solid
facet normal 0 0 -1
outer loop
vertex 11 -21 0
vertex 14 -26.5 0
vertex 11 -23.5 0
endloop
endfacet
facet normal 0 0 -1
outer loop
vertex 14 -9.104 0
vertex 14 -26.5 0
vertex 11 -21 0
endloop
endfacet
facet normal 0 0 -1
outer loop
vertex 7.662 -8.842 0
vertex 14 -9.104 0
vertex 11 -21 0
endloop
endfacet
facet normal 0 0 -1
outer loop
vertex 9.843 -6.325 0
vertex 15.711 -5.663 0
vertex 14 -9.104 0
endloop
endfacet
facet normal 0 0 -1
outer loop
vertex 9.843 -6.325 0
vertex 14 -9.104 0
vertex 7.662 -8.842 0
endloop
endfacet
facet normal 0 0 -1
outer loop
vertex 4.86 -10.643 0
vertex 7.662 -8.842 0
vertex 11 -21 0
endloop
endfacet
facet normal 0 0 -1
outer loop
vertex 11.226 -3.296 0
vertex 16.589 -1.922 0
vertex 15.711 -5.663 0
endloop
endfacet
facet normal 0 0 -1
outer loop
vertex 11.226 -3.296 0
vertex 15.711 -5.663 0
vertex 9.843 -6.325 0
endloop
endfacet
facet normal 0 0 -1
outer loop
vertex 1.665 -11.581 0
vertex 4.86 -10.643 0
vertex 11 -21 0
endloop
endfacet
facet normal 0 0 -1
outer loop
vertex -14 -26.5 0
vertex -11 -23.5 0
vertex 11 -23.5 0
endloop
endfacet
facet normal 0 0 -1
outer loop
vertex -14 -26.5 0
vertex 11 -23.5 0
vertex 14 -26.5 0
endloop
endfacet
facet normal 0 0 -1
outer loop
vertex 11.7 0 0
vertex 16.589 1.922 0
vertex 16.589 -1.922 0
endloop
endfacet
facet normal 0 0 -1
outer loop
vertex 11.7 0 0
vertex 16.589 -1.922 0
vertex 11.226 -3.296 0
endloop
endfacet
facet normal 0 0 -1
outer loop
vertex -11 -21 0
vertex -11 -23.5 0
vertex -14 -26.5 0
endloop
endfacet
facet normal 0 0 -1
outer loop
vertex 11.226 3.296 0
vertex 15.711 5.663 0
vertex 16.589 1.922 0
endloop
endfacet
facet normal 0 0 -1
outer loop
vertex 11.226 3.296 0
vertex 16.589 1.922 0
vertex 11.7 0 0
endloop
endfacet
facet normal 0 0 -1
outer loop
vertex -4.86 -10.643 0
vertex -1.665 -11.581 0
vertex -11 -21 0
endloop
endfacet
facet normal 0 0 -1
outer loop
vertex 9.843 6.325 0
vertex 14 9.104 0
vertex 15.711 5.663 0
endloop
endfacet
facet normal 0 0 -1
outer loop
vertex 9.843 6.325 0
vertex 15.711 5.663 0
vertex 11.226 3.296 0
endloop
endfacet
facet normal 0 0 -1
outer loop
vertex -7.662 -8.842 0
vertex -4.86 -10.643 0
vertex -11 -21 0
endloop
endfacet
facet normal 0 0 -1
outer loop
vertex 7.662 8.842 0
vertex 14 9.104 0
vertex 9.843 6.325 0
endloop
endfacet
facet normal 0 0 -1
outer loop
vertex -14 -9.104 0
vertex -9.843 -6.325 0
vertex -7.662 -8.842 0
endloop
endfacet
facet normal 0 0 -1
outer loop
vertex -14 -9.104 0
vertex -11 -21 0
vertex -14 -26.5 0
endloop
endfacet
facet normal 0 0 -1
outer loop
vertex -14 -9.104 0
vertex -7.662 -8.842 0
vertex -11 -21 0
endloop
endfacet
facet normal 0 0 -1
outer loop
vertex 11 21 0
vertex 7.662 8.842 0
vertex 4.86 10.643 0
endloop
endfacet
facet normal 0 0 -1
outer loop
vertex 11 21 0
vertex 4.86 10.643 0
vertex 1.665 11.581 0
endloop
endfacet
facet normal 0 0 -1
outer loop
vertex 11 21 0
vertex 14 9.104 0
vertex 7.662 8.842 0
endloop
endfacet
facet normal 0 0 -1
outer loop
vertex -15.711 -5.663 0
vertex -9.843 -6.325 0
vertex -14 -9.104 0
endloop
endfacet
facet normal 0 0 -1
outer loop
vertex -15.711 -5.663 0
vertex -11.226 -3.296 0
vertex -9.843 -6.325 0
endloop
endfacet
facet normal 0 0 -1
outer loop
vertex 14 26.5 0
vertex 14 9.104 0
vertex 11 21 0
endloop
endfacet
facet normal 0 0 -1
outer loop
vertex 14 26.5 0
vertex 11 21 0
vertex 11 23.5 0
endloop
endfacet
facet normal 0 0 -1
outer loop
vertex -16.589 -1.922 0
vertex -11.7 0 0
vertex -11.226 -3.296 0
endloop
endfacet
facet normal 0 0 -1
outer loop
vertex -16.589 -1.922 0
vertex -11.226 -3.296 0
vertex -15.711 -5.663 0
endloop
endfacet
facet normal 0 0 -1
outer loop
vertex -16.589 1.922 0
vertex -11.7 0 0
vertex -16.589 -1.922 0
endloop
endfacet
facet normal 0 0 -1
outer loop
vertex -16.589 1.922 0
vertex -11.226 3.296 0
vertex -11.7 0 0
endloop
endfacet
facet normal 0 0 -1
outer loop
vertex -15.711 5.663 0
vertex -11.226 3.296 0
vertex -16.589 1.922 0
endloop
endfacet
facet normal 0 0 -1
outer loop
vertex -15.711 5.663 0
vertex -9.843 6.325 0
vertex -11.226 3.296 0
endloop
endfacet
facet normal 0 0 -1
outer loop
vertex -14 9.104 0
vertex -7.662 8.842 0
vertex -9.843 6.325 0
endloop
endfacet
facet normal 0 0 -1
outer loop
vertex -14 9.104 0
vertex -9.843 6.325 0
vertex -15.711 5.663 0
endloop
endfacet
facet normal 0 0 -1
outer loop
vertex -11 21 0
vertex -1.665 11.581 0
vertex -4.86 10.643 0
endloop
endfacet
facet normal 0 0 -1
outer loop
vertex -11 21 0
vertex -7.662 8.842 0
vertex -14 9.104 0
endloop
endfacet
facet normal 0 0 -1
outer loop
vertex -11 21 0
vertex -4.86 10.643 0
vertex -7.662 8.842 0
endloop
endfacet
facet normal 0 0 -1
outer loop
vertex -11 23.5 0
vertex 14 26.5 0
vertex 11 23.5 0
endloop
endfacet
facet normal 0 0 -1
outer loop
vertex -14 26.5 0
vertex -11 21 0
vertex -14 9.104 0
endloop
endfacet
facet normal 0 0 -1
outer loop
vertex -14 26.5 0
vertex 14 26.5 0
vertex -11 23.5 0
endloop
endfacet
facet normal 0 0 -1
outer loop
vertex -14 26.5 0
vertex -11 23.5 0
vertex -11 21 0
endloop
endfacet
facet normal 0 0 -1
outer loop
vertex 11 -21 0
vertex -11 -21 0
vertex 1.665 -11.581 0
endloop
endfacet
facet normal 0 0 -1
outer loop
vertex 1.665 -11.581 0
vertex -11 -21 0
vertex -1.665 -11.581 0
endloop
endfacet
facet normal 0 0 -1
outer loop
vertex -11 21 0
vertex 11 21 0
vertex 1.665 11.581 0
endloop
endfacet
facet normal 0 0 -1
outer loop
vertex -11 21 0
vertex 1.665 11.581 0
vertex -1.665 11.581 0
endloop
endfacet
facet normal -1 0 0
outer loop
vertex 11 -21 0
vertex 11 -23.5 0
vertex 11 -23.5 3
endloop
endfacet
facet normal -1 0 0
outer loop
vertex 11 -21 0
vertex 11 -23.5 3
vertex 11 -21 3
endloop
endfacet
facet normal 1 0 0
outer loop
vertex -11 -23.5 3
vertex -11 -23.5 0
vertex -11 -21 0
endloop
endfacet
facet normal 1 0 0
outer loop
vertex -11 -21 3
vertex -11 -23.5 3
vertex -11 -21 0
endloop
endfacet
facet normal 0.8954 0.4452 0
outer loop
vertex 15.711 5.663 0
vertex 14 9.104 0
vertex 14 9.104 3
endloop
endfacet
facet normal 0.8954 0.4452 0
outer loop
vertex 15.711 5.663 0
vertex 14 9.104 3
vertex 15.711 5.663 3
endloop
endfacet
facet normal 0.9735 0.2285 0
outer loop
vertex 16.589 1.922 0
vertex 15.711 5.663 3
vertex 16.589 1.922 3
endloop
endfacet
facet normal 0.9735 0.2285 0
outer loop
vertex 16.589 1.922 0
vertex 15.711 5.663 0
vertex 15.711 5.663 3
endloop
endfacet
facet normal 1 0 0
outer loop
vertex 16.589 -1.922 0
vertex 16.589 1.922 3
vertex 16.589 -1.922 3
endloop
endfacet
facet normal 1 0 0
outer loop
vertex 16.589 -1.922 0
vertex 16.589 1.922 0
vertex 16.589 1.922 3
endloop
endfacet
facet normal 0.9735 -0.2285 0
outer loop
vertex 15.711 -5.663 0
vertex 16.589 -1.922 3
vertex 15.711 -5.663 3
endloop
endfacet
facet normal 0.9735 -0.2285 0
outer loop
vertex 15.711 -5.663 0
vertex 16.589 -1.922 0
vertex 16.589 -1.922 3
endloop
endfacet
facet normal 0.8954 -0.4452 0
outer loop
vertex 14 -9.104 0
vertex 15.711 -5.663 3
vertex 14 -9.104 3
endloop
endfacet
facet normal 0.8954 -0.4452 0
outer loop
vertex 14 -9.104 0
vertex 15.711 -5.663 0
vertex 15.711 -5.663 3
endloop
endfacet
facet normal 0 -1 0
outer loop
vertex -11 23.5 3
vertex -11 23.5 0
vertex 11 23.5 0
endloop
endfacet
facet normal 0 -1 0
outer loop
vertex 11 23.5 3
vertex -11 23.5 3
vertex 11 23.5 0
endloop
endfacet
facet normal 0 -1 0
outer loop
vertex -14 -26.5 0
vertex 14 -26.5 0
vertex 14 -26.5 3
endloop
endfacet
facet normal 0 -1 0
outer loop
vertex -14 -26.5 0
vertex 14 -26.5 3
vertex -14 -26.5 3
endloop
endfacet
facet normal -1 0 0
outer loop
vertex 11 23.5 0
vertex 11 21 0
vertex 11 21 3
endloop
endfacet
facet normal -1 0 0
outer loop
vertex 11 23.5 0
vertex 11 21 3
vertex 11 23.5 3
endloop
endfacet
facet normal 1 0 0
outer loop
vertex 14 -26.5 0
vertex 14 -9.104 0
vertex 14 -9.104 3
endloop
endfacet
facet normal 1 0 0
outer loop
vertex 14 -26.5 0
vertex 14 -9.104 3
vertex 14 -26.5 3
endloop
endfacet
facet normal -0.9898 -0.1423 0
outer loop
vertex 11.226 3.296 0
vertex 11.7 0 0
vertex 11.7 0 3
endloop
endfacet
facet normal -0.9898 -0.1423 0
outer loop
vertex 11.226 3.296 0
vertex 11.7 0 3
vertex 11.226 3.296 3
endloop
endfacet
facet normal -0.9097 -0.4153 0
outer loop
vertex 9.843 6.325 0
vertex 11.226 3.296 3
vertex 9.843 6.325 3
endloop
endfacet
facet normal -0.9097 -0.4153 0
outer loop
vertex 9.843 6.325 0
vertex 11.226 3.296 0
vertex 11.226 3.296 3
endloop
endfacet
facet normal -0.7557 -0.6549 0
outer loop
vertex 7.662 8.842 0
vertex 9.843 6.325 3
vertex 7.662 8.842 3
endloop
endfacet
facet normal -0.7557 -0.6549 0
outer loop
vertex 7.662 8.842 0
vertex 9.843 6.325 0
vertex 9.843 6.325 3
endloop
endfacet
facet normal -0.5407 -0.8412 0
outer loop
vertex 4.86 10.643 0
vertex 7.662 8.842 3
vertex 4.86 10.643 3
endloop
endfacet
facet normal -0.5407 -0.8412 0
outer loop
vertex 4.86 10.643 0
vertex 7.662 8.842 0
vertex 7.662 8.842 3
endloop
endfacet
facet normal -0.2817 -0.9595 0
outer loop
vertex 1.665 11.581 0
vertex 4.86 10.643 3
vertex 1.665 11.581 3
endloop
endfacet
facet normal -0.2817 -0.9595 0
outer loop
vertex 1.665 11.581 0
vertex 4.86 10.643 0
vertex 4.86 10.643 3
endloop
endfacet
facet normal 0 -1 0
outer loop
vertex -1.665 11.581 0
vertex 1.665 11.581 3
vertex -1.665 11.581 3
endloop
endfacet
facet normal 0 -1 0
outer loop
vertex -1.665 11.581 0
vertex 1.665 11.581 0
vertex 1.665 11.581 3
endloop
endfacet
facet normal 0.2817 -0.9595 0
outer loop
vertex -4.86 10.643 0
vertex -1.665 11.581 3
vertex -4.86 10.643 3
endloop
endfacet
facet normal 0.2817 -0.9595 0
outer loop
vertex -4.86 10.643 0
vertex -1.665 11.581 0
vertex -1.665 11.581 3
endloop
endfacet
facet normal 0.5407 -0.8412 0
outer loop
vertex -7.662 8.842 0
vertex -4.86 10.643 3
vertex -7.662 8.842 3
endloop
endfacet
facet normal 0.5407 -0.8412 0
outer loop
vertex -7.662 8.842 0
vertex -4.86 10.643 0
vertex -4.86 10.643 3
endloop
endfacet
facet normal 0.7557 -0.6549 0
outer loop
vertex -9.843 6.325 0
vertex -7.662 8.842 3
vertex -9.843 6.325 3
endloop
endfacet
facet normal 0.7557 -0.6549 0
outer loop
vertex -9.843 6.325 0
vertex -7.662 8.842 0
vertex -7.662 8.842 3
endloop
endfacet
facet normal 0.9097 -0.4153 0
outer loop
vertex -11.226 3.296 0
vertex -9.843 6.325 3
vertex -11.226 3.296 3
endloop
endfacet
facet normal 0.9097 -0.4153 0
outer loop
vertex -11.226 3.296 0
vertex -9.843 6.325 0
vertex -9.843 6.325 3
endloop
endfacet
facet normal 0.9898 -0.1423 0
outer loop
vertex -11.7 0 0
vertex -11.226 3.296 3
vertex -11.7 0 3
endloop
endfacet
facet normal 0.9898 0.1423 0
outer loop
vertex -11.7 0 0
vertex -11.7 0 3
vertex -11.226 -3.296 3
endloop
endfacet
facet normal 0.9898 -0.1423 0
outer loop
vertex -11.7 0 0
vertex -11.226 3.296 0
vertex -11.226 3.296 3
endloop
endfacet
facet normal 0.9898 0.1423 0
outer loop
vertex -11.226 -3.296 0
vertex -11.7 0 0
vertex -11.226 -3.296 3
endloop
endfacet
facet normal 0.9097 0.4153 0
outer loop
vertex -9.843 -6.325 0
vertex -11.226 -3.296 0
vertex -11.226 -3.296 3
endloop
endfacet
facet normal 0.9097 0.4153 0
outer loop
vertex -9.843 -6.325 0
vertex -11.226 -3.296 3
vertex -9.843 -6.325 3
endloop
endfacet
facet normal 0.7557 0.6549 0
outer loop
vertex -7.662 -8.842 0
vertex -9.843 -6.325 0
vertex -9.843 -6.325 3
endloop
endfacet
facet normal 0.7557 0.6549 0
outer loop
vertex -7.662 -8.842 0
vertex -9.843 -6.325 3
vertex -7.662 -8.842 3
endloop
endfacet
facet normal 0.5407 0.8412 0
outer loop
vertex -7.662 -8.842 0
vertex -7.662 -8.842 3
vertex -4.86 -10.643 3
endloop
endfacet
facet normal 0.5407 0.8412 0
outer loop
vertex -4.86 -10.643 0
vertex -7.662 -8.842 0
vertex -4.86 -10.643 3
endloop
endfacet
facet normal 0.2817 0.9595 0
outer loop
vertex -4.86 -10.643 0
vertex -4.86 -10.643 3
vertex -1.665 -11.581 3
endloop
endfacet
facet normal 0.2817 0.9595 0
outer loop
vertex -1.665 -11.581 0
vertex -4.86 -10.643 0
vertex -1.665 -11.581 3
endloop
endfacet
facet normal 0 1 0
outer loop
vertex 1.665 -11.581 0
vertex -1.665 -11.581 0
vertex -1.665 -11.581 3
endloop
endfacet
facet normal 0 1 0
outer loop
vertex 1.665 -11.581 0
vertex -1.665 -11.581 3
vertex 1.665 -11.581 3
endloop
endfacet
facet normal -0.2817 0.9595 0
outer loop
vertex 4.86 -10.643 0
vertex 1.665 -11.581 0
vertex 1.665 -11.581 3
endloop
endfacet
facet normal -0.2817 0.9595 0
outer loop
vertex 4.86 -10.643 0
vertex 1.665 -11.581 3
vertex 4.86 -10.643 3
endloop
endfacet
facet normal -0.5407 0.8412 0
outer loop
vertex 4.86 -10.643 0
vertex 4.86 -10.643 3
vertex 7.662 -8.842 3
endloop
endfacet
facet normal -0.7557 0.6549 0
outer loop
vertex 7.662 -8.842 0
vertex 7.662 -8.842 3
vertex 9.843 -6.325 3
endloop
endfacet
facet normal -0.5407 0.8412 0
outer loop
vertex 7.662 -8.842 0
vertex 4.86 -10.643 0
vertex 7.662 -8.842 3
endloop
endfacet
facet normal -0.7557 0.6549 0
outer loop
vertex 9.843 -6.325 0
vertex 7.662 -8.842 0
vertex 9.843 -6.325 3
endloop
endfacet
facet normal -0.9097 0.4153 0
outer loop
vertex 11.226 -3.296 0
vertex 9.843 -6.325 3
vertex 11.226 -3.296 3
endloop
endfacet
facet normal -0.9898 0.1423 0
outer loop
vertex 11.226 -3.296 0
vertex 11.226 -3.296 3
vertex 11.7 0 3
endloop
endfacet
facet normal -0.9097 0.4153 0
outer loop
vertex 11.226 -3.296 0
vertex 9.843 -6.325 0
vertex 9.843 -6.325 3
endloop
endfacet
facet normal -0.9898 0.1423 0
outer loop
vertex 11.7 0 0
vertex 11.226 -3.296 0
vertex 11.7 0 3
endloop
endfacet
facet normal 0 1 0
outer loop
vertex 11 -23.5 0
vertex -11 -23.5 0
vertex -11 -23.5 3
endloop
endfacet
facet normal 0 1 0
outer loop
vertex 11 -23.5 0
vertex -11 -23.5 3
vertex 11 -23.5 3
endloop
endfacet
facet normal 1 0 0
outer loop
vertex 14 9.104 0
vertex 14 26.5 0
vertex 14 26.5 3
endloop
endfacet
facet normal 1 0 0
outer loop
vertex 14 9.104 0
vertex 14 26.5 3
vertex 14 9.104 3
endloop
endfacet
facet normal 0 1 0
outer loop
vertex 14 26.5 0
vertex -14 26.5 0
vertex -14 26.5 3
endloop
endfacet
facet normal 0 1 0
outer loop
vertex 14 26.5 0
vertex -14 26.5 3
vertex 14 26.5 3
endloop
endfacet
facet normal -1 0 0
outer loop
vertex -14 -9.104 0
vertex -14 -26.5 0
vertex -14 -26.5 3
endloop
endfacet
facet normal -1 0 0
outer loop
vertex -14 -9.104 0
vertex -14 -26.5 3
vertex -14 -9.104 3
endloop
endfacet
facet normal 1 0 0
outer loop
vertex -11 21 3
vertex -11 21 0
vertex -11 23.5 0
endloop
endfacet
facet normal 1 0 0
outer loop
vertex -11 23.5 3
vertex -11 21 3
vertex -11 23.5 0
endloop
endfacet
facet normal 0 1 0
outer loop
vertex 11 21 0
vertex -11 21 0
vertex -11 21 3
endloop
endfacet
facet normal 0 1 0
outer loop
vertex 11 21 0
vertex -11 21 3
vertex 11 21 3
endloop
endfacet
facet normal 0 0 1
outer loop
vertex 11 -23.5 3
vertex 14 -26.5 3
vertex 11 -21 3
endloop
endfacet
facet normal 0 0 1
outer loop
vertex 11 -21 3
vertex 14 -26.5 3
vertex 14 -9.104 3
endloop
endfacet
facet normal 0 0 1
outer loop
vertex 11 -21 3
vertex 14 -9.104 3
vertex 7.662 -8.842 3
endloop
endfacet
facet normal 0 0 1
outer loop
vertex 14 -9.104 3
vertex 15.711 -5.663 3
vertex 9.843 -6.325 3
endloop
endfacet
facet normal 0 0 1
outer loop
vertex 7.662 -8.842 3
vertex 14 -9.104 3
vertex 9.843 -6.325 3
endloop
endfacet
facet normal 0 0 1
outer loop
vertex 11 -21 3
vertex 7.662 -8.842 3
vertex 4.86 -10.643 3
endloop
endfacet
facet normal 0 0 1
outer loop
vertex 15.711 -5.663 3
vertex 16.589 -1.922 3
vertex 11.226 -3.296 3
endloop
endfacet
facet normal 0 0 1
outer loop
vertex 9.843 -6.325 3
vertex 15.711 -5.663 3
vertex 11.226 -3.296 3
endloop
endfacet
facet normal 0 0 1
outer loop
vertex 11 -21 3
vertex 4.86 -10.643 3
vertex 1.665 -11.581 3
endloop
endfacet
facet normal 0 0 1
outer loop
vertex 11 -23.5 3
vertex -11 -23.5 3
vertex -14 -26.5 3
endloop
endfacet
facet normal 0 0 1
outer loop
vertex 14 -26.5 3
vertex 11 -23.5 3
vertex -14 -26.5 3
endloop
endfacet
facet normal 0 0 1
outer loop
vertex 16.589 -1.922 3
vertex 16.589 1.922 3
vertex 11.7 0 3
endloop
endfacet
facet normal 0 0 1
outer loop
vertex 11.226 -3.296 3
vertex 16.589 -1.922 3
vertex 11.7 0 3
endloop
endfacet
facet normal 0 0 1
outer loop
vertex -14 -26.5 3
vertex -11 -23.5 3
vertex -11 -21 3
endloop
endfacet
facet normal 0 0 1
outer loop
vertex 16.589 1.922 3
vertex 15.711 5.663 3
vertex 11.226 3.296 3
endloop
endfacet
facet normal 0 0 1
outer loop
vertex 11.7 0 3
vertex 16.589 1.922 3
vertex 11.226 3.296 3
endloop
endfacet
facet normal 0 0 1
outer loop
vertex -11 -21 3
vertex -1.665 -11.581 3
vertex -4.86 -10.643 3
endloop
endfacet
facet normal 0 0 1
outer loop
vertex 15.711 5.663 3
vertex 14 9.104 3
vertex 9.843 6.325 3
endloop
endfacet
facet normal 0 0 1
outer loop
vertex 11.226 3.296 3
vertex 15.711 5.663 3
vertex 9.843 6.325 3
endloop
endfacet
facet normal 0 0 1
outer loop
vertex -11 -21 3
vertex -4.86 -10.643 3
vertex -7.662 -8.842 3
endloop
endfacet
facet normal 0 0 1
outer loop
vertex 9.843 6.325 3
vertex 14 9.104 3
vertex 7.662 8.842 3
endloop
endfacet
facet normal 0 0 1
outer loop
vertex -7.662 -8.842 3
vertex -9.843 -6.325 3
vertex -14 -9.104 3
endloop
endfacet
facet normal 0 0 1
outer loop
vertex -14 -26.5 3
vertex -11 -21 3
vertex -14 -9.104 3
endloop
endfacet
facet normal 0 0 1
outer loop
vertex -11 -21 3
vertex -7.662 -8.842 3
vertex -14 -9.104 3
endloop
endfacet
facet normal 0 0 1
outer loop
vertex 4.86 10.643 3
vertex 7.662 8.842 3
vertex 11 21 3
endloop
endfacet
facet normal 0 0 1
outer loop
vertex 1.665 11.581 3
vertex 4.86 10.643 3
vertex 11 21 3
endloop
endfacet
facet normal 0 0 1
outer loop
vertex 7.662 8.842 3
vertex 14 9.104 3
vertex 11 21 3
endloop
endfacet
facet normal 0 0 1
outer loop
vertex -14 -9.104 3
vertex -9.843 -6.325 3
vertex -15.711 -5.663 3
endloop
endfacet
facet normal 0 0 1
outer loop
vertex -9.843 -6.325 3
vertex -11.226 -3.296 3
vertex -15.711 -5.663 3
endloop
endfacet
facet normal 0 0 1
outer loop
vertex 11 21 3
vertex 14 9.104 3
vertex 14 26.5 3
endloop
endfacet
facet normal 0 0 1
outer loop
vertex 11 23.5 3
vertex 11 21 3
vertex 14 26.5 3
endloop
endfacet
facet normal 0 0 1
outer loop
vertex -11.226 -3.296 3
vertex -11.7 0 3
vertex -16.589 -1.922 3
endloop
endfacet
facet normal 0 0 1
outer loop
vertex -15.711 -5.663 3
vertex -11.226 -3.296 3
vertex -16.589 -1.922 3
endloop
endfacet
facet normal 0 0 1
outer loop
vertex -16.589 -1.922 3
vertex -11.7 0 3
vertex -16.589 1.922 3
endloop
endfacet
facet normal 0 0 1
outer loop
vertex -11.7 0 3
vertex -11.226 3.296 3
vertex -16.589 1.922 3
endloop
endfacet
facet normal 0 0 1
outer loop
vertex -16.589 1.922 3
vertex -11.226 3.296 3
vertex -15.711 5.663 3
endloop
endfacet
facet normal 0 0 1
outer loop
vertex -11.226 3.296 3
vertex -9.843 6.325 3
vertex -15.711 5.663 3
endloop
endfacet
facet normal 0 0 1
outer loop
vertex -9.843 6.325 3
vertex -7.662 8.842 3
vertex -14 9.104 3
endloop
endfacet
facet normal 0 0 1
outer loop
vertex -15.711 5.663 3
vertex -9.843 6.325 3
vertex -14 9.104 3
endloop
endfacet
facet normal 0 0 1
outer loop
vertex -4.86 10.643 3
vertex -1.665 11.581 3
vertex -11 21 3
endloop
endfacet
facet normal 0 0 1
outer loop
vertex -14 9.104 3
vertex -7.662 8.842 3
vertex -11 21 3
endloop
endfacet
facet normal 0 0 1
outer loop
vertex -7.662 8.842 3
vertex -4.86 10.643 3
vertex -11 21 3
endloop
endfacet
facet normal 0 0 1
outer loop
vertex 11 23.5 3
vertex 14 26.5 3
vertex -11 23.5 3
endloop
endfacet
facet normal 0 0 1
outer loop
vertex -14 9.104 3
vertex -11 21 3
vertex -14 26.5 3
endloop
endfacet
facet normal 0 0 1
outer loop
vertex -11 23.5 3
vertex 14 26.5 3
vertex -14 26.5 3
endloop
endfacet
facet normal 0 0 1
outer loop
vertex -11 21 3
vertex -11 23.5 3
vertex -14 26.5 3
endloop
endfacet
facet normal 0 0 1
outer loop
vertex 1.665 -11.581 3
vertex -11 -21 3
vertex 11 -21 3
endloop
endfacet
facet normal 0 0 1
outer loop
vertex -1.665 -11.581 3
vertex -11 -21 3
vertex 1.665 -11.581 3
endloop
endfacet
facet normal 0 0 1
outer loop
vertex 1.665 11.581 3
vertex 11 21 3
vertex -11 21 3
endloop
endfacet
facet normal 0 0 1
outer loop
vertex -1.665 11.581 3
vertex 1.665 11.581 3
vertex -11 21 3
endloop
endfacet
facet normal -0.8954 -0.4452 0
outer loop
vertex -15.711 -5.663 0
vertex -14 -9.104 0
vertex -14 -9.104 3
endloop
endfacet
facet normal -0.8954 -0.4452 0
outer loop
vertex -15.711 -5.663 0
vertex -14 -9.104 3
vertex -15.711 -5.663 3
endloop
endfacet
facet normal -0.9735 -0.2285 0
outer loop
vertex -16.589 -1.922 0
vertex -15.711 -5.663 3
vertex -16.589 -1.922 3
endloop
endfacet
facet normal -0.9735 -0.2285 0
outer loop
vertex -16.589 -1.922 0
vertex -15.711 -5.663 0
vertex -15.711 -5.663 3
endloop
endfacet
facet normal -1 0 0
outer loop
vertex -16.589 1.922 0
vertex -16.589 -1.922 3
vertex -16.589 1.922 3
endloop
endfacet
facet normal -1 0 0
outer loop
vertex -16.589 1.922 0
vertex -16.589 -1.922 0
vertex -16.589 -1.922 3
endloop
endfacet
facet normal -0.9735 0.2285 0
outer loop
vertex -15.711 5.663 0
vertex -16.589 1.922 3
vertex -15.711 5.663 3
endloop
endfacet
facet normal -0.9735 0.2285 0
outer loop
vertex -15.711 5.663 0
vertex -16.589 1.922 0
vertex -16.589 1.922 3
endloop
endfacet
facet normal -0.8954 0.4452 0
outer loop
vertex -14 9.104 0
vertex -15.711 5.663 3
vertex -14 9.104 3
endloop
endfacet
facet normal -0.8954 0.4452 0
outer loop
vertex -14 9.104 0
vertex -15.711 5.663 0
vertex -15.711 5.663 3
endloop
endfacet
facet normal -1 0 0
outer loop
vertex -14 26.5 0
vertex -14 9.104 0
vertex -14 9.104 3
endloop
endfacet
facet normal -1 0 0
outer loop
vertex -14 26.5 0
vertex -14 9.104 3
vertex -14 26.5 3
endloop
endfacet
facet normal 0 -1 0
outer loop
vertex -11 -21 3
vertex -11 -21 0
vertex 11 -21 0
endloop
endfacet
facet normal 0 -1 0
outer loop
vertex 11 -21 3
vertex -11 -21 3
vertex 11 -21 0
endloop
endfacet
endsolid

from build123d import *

# Parameters (mm, degrees)
CROQUIS1_R              = 11.7
CROQUIS1_W              = 22
CROQUIS1_H              = 2.5
SALIENTE_EXTRUIR1_DEPTH = 3


with BuildPart() as part:
    # Croquis1 → Saliente-Extruir1 (new body)
    with BuildSketch(Plane.XY):
        with BuildLine():
            Line((-14, 9.104394543), (-14, 26.5))
            Line((-14, 26.5), (14, 26.5))
            Line((14, 26.5), (14, 9.104394543))
            ThreePointArc((14, 9.104394543), (16.7, 0), (14, -9.104394543))
            Line((14, -9.104394543), (14, -26.5))
            Line((14, -26.5), (-14, -26.5))
            Line((-14, -26.5), (-14, -9.104394543))
            ThreePointArc((-14, -9.104394543), (-16.7, 0), (-14, 9.104394543))
        make_face()
        Circle(CROQUIS1_R, mode=Mode.SUBTRACT)
        with Locations((0, 22.25)):
            Rectangle(CROQUIS1_W, CROQUIS1_H, mode=Mode.SUBTRACT)
        with Locations((0, -22.25)):
            Rectangle(CROQUIS1_W, CROQUIS1_H, mode=Mode.SUBTRACT)
    extrude(amount=SALIENTE_EXTRUIR1_DEPTH)


solid = part.part
